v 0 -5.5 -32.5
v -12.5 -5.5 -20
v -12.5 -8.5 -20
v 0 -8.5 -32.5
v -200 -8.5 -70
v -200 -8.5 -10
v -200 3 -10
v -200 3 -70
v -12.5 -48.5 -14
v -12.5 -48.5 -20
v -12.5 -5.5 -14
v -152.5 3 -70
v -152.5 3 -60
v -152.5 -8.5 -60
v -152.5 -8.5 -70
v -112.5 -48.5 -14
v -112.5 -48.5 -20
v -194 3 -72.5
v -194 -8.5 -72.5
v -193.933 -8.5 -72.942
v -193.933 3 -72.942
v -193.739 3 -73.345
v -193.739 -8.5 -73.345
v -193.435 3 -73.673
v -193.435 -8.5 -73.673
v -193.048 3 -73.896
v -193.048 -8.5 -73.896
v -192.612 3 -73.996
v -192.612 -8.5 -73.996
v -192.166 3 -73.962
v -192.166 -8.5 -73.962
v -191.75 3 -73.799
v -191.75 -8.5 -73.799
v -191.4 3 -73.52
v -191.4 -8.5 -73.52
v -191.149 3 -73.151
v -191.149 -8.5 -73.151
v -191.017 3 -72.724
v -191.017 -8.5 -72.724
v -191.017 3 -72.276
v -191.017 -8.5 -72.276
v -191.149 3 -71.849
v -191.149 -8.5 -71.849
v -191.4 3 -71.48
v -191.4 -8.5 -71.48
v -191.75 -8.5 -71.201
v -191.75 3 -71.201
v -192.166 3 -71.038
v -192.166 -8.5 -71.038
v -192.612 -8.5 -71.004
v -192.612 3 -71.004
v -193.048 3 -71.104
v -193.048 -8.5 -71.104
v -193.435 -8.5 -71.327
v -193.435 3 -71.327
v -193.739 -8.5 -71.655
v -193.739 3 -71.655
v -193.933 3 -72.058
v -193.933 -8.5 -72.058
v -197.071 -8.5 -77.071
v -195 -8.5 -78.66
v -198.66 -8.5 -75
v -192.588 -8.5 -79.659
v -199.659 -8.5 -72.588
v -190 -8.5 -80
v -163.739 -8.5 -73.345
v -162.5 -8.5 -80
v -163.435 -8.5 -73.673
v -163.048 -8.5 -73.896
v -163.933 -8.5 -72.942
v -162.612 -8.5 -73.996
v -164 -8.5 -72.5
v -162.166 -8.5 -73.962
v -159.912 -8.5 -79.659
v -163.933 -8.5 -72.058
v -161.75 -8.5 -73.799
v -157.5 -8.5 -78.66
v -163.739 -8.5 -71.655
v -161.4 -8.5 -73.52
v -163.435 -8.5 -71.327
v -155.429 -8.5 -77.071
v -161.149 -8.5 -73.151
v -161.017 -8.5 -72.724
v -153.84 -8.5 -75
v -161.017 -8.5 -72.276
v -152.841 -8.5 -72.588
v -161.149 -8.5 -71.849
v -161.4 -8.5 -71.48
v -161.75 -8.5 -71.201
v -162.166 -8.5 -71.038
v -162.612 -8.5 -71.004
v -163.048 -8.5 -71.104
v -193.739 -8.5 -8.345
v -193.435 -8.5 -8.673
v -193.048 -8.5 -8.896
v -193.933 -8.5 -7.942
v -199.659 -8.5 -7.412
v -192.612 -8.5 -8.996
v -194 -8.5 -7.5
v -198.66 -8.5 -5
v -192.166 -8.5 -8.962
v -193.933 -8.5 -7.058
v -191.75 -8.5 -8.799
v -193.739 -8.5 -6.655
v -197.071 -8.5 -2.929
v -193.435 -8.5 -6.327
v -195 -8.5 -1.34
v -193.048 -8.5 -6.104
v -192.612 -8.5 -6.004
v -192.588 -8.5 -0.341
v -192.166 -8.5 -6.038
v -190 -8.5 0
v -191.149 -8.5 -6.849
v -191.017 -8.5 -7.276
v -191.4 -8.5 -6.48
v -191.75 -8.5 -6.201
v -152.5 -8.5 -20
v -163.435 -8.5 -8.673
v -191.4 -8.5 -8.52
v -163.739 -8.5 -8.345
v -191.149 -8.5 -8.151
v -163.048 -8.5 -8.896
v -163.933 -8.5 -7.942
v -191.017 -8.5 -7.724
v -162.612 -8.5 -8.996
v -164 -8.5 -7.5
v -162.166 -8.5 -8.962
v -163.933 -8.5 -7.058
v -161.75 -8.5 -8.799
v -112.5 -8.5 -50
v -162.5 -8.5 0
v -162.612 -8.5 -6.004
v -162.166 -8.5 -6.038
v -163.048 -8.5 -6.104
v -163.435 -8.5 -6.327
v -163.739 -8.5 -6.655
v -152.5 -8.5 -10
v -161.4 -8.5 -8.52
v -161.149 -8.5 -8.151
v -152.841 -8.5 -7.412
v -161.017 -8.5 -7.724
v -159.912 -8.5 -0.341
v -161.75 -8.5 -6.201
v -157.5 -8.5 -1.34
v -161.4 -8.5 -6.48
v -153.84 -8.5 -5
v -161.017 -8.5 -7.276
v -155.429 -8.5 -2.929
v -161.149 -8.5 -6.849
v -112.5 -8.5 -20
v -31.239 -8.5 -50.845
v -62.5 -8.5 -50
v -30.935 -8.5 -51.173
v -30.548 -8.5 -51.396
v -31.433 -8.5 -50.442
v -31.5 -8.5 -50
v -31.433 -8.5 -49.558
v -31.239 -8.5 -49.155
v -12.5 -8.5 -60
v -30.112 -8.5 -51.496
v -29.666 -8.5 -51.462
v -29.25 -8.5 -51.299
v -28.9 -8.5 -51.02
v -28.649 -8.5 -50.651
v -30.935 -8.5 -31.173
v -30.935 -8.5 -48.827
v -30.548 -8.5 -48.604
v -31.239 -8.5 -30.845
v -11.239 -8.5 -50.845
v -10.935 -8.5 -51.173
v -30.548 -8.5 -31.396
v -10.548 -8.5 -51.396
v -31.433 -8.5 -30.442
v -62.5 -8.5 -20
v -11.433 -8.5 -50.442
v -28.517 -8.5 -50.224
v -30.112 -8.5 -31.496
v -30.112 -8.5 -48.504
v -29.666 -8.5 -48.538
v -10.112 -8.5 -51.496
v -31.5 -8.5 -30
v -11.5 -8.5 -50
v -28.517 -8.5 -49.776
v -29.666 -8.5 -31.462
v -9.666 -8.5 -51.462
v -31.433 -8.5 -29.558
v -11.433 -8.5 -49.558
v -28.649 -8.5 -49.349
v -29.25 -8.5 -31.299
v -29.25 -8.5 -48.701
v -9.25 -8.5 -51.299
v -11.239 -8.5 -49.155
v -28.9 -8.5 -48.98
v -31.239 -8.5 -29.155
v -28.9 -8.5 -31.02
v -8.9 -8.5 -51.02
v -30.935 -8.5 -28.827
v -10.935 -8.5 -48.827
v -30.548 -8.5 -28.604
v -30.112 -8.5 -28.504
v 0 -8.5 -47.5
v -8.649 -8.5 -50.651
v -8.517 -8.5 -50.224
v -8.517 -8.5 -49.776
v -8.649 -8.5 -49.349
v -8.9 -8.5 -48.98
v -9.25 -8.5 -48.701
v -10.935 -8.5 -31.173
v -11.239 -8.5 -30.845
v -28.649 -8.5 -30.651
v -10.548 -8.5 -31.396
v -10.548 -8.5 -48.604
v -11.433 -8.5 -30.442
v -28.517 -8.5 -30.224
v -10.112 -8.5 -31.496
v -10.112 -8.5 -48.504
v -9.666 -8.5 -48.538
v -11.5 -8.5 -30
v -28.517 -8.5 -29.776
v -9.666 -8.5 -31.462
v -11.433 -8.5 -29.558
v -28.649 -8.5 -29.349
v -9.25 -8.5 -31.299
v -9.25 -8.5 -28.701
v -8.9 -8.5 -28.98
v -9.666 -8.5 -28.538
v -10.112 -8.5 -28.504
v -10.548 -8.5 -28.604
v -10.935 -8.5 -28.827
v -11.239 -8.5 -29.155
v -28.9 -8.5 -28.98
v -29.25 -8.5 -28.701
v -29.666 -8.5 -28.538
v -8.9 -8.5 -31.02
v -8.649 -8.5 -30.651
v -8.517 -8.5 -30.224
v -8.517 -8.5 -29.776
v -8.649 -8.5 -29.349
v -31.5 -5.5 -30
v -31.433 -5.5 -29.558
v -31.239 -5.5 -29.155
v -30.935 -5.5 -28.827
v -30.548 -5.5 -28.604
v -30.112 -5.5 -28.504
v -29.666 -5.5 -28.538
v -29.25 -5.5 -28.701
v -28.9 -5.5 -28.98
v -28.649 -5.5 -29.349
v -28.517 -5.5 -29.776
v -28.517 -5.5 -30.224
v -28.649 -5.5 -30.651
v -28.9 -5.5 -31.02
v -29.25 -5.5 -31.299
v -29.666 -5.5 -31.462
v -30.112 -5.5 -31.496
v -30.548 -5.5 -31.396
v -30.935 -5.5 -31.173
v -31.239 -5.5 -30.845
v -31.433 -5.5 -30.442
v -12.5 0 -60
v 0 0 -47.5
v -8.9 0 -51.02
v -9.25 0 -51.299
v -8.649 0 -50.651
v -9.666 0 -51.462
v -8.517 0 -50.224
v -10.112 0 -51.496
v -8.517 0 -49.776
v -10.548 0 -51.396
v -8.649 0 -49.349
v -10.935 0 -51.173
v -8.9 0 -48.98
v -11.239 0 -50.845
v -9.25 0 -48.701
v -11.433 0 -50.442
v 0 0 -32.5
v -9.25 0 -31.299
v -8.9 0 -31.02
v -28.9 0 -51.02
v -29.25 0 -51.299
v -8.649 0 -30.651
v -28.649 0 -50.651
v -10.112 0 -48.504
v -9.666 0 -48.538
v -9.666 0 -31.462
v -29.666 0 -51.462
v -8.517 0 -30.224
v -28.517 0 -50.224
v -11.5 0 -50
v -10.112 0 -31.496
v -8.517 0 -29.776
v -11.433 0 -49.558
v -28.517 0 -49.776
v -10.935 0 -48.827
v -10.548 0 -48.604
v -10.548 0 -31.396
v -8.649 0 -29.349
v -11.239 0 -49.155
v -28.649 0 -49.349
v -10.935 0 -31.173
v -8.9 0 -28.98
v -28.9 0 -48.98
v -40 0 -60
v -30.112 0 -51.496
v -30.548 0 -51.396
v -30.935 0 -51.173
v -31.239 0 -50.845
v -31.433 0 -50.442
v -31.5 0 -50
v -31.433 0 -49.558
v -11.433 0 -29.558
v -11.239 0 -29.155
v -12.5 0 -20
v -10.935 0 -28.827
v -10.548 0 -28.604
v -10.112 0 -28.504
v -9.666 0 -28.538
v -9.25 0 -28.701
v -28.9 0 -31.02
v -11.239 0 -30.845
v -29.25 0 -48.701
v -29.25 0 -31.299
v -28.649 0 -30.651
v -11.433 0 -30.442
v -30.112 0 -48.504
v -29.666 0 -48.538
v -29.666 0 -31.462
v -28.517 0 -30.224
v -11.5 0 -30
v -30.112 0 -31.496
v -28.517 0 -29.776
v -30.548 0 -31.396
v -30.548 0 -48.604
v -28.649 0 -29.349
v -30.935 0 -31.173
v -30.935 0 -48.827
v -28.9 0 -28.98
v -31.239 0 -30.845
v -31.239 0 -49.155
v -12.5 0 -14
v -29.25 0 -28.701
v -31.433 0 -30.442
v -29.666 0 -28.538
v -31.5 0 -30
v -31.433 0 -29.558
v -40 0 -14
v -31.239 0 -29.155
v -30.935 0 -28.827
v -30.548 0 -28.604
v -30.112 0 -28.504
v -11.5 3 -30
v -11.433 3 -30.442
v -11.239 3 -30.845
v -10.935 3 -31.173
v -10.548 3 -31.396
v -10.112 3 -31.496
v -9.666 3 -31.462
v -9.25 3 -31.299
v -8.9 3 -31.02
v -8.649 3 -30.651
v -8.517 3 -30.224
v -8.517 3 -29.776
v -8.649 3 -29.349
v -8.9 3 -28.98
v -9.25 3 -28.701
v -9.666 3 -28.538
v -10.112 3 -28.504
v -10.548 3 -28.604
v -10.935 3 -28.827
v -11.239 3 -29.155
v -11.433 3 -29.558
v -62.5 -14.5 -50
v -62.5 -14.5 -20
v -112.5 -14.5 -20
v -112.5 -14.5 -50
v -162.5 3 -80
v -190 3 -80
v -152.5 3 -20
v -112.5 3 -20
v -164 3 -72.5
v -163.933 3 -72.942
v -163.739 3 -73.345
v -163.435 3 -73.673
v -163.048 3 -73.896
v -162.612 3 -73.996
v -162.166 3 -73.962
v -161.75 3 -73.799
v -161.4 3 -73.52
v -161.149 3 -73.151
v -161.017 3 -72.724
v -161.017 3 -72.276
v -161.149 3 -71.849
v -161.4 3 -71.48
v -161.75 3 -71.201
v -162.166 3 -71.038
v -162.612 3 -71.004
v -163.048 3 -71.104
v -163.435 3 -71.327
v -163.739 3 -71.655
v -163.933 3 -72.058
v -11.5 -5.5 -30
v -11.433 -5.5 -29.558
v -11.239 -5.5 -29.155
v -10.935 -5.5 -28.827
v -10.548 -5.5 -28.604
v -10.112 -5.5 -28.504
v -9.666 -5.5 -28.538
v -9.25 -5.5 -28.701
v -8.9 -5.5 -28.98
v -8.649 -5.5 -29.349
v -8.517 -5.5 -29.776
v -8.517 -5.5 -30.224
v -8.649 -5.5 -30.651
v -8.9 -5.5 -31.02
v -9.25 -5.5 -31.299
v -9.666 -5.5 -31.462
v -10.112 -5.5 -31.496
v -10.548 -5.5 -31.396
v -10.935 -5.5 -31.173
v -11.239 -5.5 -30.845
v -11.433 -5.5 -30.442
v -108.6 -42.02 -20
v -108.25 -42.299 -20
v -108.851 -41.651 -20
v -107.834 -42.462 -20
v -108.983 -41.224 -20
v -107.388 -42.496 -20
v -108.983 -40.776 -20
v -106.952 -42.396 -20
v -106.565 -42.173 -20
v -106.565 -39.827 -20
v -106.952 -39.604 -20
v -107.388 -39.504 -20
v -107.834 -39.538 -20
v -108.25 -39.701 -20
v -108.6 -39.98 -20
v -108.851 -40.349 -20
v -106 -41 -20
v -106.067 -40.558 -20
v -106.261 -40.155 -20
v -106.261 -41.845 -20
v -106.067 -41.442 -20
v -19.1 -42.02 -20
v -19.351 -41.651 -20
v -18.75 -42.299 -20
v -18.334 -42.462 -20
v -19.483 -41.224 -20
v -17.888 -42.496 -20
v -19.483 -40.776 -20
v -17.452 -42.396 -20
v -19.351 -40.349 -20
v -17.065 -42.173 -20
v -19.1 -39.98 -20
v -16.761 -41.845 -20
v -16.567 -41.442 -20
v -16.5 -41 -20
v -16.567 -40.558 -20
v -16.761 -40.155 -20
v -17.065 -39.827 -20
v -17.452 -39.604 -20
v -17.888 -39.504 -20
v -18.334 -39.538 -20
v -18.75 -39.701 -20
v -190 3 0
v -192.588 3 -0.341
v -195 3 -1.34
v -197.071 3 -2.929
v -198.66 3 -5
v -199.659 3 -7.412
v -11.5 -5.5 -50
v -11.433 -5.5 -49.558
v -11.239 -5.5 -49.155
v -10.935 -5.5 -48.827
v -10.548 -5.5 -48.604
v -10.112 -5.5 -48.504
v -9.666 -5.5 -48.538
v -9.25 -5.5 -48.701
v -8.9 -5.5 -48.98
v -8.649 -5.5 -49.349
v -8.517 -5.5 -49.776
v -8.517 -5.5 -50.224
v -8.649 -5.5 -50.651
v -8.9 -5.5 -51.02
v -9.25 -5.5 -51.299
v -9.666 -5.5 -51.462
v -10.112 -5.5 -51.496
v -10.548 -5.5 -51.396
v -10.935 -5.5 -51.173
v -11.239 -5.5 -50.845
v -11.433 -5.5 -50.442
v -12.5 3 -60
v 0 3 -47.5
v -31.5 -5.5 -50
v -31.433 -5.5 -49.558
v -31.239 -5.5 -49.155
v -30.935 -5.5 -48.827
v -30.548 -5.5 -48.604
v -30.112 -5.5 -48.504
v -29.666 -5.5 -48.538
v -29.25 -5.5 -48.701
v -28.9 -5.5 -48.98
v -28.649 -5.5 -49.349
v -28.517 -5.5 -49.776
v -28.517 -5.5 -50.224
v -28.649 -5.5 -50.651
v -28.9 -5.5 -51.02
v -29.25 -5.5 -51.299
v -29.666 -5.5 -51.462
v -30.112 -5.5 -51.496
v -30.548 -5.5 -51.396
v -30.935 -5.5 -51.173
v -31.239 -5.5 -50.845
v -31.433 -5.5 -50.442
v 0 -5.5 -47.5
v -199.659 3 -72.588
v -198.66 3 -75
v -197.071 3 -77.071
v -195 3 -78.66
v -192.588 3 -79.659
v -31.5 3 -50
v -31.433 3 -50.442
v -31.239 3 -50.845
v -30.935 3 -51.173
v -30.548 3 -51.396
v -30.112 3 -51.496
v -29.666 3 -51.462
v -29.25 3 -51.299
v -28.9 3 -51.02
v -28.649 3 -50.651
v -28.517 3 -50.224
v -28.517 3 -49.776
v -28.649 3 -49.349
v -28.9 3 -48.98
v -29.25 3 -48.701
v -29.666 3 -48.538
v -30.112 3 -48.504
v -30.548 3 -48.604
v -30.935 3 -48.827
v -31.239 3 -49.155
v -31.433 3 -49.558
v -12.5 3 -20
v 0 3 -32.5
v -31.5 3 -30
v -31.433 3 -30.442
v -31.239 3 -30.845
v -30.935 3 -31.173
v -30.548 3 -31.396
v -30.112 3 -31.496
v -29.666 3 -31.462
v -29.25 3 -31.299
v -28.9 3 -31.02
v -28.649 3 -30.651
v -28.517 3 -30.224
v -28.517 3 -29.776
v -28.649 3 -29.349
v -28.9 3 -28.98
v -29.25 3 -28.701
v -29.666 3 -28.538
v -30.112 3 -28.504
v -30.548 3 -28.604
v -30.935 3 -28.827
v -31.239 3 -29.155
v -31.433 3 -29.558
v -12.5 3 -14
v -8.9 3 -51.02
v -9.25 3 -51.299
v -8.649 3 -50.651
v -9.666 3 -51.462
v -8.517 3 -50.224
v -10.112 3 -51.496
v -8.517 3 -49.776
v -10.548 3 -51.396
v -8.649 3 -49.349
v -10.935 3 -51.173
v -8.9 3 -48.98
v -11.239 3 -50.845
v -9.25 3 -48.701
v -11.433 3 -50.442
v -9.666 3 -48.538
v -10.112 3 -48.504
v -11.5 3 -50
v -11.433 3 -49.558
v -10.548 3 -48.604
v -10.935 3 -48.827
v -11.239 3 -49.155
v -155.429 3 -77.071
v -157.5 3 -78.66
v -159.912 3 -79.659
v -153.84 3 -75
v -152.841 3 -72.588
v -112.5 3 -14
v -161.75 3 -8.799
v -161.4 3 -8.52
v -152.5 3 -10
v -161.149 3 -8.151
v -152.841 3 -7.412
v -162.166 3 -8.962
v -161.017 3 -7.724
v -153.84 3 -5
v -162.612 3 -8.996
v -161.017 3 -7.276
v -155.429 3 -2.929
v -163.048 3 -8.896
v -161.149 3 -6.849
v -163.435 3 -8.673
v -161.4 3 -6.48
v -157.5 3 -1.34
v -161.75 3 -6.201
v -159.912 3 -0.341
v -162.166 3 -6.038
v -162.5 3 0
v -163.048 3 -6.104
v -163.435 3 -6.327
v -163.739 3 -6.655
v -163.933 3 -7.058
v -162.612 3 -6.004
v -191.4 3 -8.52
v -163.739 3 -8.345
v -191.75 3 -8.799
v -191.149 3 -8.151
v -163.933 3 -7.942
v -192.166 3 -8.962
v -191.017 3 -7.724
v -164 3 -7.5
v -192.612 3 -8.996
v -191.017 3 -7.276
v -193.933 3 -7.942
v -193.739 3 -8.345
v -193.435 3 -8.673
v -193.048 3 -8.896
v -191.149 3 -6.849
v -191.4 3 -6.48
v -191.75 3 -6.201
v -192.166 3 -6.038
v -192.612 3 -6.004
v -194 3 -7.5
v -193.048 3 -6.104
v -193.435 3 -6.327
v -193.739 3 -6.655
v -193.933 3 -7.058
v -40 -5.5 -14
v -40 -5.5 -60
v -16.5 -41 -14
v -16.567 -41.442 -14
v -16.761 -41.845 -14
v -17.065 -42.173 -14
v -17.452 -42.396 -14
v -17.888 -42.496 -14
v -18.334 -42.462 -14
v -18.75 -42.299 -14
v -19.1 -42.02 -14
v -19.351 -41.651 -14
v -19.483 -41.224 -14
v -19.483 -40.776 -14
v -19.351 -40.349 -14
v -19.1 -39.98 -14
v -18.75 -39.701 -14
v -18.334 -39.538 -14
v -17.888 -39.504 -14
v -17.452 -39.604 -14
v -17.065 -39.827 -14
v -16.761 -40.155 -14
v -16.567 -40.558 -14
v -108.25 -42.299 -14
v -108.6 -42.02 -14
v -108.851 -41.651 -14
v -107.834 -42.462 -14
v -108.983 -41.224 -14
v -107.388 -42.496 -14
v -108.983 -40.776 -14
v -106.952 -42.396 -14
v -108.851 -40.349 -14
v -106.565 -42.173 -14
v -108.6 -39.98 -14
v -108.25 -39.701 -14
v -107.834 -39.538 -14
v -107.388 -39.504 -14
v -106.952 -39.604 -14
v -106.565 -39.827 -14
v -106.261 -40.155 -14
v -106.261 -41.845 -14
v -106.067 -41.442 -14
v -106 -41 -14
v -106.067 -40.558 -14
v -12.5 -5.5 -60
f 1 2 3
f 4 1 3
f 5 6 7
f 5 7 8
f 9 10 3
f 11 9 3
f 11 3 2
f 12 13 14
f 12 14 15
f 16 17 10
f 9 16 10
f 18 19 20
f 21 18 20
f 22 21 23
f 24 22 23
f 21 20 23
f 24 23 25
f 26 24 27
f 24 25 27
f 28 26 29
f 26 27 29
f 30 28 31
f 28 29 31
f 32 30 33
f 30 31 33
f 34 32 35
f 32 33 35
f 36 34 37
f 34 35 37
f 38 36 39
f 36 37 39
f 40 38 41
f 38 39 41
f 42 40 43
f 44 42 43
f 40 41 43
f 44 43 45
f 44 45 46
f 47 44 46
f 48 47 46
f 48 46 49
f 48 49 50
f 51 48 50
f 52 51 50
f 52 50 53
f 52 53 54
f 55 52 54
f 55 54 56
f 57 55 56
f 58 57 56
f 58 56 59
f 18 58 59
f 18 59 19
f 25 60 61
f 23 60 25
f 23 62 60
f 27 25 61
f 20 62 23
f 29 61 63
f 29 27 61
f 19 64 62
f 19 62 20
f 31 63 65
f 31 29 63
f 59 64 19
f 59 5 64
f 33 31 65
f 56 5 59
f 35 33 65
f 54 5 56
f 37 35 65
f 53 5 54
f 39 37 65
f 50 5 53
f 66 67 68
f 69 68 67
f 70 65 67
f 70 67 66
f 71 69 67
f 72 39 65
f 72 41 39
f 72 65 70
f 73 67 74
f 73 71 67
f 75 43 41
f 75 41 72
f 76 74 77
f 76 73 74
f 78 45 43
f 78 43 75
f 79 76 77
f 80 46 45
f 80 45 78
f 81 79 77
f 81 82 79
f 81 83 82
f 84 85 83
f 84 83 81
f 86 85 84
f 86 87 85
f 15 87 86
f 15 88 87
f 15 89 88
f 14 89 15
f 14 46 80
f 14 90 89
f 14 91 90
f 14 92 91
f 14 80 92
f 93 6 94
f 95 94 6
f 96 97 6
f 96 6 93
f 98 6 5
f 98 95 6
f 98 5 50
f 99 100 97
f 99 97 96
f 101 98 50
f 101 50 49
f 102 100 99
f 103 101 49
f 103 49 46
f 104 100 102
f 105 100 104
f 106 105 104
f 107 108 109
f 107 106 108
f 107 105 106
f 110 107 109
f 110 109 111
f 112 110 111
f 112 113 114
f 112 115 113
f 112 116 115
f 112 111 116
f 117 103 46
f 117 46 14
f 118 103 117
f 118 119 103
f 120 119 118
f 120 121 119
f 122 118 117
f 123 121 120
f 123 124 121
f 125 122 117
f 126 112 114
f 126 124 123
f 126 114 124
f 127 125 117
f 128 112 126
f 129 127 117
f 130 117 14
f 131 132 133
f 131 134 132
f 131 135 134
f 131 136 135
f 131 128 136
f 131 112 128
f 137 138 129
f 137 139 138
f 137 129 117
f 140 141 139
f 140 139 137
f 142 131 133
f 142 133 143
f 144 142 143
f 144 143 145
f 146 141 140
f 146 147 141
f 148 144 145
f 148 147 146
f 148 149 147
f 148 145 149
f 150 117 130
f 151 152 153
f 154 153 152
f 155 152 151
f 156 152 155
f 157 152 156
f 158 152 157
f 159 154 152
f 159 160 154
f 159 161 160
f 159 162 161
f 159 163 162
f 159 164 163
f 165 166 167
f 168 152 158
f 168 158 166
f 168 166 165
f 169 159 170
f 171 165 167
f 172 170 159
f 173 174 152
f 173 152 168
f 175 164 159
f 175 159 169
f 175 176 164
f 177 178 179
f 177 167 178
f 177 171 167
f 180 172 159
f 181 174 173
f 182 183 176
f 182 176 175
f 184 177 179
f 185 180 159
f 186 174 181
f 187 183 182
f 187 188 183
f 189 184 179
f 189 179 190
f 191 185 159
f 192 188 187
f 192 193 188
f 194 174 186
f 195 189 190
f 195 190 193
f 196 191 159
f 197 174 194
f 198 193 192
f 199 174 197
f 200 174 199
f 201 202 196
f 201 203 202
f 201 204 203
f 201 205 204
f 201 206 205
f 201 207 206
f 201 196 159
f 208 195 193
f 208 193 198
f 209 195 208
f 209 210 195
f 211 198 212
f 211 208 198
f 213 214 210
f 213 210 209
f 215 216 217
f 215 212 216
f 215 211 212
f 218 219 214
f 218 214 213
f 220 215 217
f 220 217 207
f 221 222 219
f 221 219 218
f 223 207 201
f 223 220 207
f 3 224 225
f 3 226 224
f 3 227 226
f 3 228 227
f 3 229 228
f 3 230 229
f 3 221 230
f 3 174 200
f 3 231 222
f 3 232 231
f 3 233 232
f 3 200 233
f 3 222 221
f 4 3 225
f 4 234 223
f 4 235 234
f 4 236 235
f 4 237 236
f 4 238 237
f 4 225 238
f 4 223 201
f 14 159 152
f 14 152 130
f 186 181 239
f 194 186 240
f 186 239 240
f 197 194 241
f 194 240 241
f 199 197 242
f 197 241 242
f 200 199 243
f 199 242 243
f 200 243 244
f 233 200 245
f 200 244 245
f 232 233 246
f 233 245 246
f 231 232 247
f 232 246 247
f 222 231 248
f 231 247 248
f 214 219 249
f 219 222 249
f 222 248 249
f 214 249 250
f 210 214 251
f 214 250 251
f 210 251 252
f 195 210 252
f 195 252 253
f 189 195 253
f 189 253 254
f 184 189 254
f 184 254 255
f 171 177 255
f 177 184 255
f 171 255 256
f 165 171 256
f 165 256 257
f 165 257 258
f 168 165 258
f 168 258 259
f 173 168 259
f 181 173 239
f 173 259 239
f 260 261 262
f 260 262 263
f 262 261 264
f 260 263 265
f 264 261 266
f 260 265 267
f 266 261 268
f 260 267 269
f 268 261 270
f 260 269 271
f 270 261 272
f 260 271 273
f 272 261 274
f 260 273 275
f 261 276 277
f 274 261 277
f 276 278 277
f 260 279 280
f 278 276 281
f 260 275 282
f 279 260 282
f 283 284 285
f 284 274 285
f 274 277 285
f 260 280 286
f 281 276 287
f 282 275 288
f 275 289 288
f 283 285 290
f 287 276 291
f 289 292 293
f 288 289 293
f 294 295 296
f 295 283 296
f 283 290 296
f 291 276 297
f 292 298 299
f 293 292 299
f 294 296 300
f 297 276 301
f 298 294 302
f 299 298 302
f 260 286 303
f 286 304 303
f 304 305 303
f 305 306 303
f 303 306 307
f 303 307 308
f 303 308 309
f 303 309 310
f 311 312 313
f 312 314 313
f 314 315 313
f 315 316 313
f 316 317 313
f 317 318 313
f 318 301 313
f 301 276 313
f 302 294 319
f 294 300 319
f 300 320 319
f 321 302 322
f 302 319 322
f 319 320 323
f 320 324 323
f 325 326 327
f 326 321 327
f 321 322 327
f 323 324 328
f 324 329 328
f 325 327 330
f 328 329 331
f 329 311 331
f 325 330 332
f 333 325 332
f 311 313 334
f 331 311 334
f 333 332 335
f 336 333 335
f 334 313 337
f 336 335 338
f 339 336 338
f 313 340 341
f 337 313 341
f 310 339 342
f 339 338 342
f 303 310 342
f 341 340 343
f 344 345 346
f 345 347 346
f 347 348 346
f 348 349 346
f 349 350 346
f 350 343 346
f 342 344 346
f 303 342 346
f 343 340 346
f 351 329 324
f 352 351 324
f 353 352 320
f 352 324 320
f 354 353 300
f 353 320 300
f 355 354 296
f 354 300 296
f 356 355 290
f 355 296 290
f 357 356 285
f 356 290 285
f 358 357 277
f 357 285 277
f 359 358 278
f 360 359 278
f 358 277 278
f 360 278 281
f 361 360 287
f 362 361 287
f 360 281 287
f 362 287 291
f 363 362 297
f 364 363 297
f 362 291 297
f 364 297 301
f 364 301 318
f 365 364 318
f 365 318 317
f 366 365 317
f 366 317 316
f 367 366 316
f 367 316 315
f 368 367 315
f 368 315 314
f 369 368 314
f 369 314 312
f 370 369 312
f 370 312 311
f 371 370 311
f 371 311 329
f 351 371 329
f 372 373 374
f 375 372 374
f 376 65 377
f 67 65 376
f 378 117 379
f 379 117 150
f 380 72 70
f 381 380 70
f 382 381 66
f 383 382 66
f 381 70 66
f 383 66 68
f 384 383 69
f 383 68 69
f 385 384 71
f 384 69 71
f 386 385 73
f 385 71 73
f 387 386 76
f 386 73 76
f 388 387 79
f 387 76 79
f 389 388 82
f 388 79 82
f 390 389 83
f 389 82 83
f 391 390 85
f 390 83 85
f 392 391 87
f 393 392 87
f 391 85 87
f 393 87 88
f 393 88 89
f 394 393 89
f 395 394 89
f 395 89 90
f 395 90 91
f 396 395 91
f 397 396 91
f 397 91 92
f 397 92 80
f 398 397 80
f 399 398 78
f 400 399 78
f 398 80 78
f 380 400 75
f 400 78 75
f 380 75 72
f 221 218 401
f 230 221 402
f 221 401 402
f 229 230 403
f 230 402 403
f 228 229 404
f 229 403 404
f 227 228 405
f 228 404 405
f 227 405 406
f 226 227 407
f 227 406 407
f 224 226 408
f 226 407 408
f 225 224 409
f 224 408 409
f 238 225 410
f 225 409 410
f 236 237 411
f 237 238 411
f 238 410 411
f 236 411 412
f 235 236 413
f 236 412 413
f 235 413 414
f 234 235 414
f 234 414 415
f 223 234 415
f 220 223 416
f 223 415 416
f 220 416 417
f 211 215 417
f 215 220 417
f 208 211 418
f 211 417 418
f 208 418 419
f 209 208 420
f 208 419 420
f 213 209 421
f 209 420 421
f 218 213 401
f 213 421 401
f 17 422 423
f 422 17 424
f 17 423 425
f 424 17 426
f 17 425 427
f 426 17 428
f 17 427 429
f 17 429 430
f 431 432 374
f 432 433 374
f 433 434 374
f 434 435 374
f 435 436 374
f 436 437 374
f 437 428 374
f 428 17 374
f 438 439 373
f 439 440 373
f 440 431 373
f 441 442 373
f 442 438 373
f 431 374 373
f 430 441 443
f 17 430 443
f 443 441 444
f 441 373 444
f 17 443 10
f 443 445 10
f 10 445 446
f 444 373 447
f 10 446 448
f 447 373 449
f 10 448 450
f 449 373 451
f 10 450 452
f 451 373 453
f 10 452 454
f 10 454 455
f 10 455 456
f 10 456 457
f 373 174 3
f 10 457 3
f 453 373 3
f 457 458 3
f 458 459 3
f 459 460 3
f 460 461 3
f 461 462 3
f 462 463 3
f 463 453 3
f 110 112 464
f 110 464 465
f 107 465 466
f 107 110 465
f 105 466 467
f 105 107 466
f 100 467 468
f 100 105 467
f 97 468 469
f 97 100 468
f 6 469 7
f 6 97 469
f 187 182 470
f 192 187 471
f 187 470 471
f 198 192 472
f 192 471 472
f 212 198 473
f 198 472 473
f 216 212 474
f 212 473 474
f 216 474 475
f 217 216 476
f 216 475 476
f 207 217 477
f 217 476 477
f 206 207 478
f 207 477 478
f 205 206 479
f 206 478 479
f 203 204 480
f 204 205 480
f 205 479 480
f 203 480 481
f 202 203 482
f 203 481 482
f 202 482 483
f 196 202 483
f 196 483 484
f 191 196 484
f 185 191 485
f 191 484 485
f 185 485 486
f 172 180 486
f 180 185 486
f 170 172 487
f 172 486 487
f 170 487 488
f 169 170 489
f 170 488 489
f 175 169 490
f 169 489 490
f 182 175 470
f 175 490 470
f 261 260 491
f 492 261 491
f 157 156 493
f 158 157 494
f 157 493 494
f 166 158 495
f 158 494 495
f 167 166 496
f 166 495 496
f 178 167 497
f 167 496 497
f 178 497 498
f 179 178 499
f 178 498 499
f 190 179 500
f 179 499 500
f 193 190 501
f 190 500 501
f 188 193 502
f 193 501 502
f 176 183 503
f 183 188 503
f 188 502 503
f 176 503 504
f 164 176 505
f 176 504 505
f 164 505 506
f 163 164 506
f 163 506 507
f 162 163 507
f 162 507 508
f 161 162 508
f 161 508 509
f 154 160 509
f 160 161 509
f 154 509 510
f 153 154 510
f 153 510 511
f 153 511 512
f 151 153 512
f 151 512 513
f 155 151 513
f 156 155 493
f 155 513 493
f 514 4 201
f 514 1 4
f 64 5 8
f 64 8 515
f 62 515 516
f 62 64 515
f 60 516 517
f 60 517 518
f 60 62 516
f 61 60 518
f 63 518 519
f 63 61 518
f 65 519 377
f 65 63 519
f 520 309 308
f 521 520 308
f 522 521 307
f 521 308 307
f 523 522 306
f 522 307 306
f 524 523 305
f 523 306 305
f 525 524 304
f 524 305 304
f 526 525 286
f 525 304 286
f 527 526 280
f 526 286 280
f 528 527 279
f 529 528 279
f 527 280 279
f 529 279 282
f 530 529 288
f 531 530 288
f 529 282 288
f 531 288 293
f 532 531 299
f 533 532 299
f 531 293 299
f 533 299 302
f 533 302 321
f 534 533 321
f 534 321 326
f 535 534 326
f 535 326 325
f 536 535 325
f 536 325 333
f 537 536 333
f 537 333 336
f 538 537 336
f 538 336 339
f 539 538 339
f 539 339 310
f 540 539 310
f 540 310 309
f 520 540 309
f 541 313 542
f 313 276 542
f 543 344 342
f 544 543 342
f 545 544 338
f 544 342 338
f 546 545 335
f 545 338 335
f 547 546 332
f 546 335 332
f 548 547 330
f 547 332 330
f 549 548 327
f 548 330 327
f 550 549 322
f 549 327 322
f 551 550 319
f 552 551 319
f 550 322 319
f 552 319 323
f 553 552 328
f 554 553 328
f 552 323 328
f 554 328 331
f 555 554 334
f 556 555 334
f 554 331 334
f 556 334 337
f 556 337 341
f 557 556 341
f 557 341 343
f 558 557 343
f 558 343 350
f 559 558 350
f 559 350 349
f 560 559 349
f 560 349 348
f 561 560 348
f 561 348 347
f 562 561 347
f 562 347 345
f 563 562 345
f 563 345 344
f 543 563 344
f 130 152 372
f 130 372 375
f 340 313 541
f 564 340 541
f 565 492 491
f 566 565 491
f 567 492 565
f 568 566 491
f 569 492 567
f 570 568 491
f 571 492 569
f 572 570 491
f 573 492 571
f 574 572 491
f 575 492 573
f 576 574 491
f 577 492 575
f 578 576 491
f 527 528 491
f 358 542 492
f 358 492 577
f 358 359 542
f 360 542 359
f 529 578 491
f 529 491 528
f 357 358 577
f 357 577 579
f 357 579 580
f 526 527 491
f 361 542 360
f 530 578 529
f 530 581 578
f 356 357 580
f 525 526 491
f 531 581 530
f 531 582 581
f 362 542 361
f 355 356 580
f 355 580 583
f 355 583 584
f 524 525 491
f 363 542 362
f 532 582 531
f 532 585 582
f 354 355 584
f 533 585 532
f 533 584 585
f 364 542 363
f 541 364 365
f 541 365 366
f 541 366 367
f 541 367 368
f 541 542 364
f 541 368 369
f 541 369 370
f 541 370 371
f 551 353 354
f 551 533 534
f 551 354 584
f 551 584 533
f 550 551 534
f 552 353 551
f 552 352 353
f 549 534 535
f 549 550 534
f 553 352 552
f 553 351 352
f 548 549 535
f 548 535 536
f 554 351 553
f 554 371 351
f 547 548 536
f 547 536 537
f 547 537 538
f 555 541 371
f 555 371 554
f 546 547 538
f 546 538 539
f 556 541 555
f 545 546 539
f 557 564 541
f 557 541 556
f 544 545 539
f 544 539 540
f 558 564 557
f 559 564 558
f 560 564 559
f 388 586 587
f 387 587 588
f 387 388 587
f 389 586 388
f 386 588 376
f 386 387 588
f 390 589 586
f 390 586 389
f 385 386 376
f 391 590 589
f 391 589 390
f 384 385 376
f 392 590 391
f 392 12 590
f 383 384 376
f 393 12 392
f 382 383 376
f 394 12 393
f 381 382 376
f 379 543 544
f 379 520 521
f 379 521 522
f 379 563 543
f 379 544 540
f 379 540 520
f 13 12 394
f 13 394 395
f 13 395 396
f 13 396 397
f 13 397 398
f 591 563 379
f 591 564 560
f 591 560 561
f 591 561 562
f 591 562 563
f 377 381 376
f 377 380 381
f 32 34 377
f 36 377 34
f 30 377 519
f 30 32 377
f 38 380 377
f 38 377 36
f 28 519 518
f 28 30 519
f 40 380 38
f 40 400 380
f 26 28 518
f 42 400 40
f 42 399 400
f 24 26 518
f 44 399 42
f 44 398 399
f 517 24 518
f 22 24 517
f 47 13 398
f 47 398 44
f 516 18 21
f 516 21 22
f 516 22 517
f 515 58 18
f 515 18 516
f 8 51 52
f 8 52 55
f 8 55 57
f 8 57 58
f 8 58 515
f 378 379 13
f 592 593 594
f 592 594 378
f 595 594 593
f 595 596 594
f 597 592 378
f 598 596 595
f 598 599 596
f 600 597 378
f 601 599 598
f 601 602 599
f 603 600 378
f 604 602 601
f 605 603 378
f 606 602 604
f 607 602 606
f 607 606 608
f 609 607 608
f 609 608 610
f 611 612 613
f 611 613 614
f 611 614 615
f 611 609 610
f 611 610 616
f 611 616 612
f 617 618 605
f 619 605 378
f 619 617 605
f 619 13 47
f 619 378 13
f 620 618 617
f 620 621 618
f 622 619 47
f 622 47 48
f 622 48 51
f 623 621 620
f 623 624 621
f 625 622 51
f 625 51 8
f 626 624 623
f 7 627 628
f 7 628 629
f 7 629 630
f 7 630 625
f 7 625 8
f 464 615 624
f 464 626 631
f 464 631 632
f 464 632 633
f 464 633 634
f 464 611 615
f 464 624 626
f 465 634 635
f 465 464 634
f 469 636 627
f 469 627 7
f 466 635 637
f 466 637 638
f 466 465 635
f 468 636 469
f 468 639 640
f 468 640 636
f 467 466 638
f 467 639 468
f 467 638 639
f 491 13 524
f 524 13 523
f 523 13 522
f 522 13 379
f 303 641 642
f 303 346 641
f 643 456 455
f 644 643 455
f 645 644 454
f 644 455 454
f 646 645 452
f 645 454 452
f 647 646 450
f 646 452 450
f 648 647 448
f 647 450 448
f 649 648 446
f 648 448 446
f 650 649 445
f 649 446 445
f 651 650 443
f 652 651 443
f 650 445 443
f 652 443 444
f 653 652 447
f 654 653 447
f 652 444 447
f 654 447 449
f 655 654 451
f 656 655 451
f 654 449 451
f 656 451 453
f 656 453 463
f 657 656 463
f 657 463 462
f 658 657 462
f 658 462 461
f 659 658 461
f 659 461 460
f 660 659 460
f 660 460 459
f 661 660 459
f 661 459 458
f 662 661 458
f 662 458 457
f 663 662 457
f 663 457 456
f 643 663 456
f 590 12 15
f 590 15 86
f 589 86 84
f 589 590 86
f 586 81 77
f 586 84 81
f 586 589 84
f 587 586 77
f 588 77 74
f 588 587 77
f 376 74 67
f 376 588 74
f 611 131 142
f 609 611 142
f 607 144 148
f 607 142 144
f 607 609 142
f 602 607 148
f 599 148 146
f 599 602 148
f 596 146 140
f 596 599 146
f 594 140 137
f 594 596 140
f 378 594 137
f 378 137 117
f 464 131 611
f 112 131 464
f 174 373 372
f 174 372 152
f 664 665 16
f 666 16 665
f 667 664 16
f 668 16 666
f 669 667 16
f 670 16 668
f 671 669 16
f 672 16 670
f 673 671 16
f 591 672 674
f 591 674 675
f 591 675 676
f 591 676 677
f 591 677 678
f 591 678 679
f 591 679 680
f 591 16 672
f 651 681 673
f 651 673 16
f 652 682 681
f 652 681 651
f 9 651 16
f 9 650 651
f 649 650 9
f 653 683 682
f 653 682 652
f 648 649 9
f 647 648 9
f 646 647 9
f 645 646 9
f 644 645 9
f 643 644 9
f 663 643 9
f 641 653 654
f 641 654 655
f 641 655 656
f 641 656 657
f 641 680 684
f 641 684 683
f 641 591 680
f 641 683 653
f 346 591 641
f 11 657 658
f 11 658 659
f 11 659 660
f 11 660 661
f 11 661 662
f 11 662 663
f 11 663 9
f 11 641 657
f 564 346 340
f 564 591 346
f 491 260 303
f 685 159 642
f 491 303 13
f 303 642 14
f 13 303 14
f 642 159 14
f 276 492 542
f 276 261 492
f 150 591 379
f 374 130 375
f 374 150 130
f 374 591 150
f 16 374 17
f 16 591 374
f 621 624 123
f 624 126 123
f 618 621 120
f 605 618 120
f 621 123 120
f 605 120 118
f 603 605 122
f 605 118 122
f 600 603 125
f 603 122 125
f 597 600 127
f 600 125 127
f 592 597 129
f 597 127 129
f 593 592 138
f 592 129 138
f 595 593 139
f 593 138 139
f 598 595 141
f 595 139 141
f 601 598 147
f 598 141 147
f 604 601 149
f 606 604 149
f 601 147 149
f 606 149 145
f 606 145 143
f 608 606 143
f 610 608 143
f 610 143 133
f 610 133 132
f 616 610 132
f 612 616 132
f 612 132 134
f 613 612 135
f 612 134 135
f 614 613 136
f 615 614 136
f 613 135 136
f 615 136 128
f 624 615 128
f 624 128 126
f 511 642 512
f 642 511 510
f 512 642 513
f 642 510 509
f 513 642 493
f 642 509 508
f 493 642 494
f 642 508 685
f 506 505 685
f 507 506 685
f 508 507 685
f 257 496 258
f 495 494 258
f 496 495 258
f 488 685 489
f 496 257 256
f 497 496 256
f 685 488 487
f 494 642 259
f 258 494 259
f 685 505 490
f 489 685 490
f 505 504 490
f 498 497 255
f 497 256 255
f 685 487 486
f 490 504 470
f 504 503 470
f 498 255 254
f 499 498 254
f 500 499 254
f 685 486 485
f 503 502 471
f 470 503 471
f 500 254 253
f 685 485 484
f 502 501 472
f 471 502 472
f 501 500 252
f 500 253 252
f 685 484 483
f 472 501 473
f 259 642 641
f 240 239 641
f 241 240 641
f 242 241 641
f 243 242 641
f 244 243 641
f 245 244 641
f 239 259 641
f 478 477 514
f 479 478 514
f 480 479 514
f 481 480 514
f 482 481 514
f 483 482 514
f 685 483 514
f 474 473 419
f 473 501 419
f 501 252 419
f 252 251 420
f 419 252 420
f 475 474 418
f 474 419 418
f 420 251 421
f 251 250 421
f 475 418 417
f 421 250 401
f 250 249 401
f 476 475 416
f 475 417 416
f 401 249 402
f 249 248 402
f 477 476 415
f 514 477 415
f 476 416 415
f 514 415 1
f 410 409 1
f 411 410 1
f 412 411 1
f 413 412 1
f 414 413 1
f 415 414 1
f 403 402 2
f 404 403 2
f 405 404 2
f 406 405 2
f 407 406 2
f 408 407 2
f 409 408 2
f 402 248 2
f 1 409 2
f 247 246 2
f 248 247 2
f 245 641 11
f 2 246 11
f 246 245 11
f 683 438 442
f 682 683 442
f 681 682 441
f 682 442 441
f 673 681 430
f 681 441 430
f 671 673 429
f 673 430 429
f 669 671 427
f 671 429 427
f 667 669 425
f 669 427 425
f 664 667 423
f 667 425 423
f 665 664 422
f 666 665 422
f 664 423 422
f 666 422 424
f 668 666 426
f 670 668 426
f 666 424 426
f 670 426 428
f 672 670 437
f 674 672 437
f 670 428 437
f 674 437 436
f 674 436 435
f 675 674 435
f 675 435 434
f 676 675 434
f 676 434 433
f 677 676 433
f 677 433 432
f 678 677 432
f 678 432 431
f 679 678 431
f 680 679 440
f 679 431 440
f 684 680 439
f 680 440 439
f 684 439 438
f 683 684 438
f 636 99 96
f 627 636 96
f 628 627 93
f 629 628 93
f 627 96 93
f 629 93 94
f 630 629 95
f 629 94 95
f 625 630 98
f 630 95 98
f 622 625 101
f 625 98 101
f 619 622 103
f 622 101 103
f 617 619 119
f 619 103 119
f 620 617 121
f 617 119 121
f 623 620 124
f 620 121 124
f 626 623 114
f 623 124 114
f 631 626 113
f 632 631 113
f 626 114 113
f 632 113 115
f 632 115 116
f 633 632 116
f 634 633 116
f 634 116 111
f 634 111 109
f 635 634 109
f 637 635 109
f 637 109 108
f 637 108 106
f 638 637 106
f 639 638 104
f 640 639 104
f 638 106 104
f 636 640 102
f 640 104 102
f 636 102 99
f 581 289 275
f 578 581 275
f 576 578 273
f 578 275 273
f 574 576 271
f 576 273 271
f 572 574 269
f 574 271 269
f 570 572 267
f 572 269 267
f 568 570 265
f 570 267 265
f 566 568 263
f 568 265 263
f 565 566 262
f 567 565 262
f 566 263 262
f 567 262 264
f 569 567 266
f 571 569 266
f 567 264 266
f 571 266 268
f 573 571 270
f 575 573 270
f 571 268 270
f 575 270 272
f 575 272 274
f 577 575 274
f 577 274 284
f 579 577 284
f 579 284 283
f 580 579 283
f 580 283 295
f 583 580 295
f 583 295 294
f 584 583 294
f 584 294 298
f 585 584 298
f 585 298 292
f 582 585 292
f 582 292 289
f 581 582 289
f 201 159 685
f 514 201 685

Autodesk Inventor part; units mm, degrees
ref_plane "YZ Plane" through (0, 0, 0) normal (1, 0, 0) x (0, 1, 0)
ref_plane "XZ Plane" through (0, 0, 0) normal (0, 1, 0) x (-1, 0, 0)
sketch "Sketch1" plane through (0, 0, 0) normal (0, 1, 0) x (-1, 0, 0)
  line L0 (0, 0) -> (200, 0)
  line L1 (200, 0) -> (200, -80)
  line L2 (200, -80) -> (0, -80)
  line L3 (0, -80) -> (0, 0)
  line L4 (10, -30) -> (30, -30)
  line L5 (30, -30) -> (30, -50)
  line L6 (30, -50) -> (10, -50)
  line L7 (10, -50) -> (10, -30)
  circle A0 centre (10, -30) radius 1.5
  circle A1 centre (30, -50) radius 1.5
  circle A2 centre (30, -30) radius 1.5
  circle A3 centre (10, -50) radius 1.5
  line L8 (192.5, -7.5) -> (162.5, -7.5)
  line L9 (162.5, -7.5) -> (162.5, -72.5)
  line L10 (162.5, -72.5) -> (192.5, -72.5)
  line L11 (192.5, -72.5) -> (192.5, -7.5)
  circle A4 centre (192.5, -7.5) radius 1.5
  circle A5 centre (192.5, -72.5) radius 1.5
  circle A6 centre (162.5, -72.5) radius 1.5
  circle A7 centre (162.5, -7.5) radius 1.5
  line L12 (200, 0) -> (152.5, 0)
  line L13 (152.5, 0) -> (152.5, -80)
  line L14 (152.5, -80) -> (200, -80)
  line L15 (200, -80) -> (200, 0)
  line L16 (152.5, -20) -> (0, -20)
  line L17 (0, -20) -> (0, -60)
  line L18 (0, -60) -> (152.5, -60)
  line L19 (152.5, -60) -> (152.5, -20)
  line L20 (40, -20) -> (40, -60)
  point P0 (191, -7.5)
  point P1 (192.5, -9)
  point P2 (192.5, -71)
  point P3 (191, -72.5)
  point P4 (164, -72.5)
  point P5 (162.5, -71)
  point P6 (164, -7.5)
  point P7 (162.5, -9)
  point P8 (152.5, 0)
  point P9 (0, -20)
  dimension "d0" = 200
  dimension "d1" = 80
  dimension "d2" = 20
  dimension "d3" = 20
  dimension "d4" = 30
  dimension "d5" = 10
  dimension "d6" = 3
  dimension "d7" = 3
  dimension "d8" = 3
  dimension "d9" = 3
  dimension "d10" = 65
  dimension "d11" = 30
  dimension "d12" = 7.5
  dimension "d13" = 7.5
  dimension "d14" = 3
  dimension "d15" = 3
  dimension "d16" = 3
  dimension "d17" = 3
  dimension "d18" = 20
  dimension "d19" = 20
  dimension "d20" = 10
  dimension "d23" = 40
extrude "Extrusion1" add sketch "Sketch1" along normal blind 3 contours L0 L1 L2 L13 | L16 L20 L18 L3 | L13 L18 L20 L16 | L4 A2 L5 A1 L6 A3 L7 A0 | L8 A4 L11 A5 L10 A6 L9 A7
extrude "Extrusion2" add sketch "Sketch1" against normal blind 5.5 contours L0 L1 L2 L13 | L13 L18 L20 L16 | L8 A4 L11 A5 L10 A6 L9 A7
ref_plane "Work Plane1" through (0, -2.75, 0) normal (0, -1, 0) x (1, 0, 0)
mirror "Mirror1" about plane through (0, -2.75, 0) normal (0, -1, 0) of "Extrusion1"
chamfer "Chamfer1" distance 12.5 angle 45 4 edges at (0, 1.5, -20) (0, -7, -20) (0, -7, -60) (0, 1.5, -60)
sketch "Sketch3" plane through (-152.5, -8.5, -20) normal (0, 0, 1) x (1, 0, 0)
  line L0 (152.5, 11.5) -> (0, 11.5) projected
  line L1 (140, 11.5) -> (40, 11.5)
  line L2 (40, 11.5) -> (40, -40)
  line L3 (40, -40) -> (140, -40)
  line L4 (140, -40) -> (140, 11.5)
  line L5 (112.5, 8.5) -> (112.5, 3) projected
  line L6 (112.5, 3) -> (140, 3) projected
  line L7 (112.5, 8.5) -> (112.5, 3) projected
  line L8 (112.5, 8.5) -> (140, 8.5) projected
  line L9 (0, 11.5) -> (140, 11.5) projected
  line L10 (0, 0) -> (0, 11.5) projected
  line L11 (0, 0) -> (140, 0) projected
  line L12 (0, 0) -> (140, 0) projected
  line L13 (122.5, 0) -> (122.5, 11.5)
  line L14 (0, 11.5) -> (152.5, 11.5) projected
  line L15 (140, -40) -> (140, -32.5)
  circle A0 centre (134.5, -32.5) radius 1.5
  line L16 (140, -32.5) -> (40, -32.5)
  circle A1 centre (45, -32.5) radius 1.5
  line L17 (140, 3) -> (140, 0) projected
  line L18 (140, 11.5) -> (140, 8.5) projected
  point P0 (152.5, 8.5)
  point P1 (147.5, 11.5)
  point P2 (140, 3)
  point P3 (140, 8.5)
  point P4 (40, 11.5)
  dimension "d30" = 100
  dimension "d32" = 7.5
  dimension "d33" = 3
  dimension "d34" = 3
  dimension "d35" = 89.5
  dimension "d36" = 5
  dimension "d40" = 40
extrude "Extrusion3" add sketch "Sketch3" along normal blind 6 contours L4 L8 L13 L0 | L13 L8 L5 L6 L11 L2 L0 | L4 L11 L13 L6 | L11 L4 L16 A0 A1 L2 | L16 A1 A0 L4 L3 L2
sketch "Sketch4" plane through (-152.5, -8.5, -20) normal (0, 0, -1) x (-1, 0, 0)
  line L0 (-40, 11.5) -> (-40, -40) projected
  line L1 (-40, 0) -> (-140, 0)
  line L2 (-140, 0) -> (-140, -6)
  line L3 (-140, -6) -> (-40, -6)
  line L4 (-40, -6) -> (-40, 0)
  line L5 (-140, -40) -> (-140, 0) projected
  line L6 (-90, -6) -> (-90, 0)
  line L7 (-140, 0) -> (0, 0) projected
  point P0 (-152.5, 8.5)
  point P1 (-162.5, 0)
  dimension "d39" = 6
extrude "Extrusion4" add sketch "Sketch4" along normal blind 30 contours L0 L3 L6 L1
fillet "Fillet2" radius 10 4 edges at (-200, -2.75, -80) (-152.5, -2.75, -80) (-152.5, -2.75, 0) (-200, -2.75, 0)
properties part number "RobotBaseMotorExt"
